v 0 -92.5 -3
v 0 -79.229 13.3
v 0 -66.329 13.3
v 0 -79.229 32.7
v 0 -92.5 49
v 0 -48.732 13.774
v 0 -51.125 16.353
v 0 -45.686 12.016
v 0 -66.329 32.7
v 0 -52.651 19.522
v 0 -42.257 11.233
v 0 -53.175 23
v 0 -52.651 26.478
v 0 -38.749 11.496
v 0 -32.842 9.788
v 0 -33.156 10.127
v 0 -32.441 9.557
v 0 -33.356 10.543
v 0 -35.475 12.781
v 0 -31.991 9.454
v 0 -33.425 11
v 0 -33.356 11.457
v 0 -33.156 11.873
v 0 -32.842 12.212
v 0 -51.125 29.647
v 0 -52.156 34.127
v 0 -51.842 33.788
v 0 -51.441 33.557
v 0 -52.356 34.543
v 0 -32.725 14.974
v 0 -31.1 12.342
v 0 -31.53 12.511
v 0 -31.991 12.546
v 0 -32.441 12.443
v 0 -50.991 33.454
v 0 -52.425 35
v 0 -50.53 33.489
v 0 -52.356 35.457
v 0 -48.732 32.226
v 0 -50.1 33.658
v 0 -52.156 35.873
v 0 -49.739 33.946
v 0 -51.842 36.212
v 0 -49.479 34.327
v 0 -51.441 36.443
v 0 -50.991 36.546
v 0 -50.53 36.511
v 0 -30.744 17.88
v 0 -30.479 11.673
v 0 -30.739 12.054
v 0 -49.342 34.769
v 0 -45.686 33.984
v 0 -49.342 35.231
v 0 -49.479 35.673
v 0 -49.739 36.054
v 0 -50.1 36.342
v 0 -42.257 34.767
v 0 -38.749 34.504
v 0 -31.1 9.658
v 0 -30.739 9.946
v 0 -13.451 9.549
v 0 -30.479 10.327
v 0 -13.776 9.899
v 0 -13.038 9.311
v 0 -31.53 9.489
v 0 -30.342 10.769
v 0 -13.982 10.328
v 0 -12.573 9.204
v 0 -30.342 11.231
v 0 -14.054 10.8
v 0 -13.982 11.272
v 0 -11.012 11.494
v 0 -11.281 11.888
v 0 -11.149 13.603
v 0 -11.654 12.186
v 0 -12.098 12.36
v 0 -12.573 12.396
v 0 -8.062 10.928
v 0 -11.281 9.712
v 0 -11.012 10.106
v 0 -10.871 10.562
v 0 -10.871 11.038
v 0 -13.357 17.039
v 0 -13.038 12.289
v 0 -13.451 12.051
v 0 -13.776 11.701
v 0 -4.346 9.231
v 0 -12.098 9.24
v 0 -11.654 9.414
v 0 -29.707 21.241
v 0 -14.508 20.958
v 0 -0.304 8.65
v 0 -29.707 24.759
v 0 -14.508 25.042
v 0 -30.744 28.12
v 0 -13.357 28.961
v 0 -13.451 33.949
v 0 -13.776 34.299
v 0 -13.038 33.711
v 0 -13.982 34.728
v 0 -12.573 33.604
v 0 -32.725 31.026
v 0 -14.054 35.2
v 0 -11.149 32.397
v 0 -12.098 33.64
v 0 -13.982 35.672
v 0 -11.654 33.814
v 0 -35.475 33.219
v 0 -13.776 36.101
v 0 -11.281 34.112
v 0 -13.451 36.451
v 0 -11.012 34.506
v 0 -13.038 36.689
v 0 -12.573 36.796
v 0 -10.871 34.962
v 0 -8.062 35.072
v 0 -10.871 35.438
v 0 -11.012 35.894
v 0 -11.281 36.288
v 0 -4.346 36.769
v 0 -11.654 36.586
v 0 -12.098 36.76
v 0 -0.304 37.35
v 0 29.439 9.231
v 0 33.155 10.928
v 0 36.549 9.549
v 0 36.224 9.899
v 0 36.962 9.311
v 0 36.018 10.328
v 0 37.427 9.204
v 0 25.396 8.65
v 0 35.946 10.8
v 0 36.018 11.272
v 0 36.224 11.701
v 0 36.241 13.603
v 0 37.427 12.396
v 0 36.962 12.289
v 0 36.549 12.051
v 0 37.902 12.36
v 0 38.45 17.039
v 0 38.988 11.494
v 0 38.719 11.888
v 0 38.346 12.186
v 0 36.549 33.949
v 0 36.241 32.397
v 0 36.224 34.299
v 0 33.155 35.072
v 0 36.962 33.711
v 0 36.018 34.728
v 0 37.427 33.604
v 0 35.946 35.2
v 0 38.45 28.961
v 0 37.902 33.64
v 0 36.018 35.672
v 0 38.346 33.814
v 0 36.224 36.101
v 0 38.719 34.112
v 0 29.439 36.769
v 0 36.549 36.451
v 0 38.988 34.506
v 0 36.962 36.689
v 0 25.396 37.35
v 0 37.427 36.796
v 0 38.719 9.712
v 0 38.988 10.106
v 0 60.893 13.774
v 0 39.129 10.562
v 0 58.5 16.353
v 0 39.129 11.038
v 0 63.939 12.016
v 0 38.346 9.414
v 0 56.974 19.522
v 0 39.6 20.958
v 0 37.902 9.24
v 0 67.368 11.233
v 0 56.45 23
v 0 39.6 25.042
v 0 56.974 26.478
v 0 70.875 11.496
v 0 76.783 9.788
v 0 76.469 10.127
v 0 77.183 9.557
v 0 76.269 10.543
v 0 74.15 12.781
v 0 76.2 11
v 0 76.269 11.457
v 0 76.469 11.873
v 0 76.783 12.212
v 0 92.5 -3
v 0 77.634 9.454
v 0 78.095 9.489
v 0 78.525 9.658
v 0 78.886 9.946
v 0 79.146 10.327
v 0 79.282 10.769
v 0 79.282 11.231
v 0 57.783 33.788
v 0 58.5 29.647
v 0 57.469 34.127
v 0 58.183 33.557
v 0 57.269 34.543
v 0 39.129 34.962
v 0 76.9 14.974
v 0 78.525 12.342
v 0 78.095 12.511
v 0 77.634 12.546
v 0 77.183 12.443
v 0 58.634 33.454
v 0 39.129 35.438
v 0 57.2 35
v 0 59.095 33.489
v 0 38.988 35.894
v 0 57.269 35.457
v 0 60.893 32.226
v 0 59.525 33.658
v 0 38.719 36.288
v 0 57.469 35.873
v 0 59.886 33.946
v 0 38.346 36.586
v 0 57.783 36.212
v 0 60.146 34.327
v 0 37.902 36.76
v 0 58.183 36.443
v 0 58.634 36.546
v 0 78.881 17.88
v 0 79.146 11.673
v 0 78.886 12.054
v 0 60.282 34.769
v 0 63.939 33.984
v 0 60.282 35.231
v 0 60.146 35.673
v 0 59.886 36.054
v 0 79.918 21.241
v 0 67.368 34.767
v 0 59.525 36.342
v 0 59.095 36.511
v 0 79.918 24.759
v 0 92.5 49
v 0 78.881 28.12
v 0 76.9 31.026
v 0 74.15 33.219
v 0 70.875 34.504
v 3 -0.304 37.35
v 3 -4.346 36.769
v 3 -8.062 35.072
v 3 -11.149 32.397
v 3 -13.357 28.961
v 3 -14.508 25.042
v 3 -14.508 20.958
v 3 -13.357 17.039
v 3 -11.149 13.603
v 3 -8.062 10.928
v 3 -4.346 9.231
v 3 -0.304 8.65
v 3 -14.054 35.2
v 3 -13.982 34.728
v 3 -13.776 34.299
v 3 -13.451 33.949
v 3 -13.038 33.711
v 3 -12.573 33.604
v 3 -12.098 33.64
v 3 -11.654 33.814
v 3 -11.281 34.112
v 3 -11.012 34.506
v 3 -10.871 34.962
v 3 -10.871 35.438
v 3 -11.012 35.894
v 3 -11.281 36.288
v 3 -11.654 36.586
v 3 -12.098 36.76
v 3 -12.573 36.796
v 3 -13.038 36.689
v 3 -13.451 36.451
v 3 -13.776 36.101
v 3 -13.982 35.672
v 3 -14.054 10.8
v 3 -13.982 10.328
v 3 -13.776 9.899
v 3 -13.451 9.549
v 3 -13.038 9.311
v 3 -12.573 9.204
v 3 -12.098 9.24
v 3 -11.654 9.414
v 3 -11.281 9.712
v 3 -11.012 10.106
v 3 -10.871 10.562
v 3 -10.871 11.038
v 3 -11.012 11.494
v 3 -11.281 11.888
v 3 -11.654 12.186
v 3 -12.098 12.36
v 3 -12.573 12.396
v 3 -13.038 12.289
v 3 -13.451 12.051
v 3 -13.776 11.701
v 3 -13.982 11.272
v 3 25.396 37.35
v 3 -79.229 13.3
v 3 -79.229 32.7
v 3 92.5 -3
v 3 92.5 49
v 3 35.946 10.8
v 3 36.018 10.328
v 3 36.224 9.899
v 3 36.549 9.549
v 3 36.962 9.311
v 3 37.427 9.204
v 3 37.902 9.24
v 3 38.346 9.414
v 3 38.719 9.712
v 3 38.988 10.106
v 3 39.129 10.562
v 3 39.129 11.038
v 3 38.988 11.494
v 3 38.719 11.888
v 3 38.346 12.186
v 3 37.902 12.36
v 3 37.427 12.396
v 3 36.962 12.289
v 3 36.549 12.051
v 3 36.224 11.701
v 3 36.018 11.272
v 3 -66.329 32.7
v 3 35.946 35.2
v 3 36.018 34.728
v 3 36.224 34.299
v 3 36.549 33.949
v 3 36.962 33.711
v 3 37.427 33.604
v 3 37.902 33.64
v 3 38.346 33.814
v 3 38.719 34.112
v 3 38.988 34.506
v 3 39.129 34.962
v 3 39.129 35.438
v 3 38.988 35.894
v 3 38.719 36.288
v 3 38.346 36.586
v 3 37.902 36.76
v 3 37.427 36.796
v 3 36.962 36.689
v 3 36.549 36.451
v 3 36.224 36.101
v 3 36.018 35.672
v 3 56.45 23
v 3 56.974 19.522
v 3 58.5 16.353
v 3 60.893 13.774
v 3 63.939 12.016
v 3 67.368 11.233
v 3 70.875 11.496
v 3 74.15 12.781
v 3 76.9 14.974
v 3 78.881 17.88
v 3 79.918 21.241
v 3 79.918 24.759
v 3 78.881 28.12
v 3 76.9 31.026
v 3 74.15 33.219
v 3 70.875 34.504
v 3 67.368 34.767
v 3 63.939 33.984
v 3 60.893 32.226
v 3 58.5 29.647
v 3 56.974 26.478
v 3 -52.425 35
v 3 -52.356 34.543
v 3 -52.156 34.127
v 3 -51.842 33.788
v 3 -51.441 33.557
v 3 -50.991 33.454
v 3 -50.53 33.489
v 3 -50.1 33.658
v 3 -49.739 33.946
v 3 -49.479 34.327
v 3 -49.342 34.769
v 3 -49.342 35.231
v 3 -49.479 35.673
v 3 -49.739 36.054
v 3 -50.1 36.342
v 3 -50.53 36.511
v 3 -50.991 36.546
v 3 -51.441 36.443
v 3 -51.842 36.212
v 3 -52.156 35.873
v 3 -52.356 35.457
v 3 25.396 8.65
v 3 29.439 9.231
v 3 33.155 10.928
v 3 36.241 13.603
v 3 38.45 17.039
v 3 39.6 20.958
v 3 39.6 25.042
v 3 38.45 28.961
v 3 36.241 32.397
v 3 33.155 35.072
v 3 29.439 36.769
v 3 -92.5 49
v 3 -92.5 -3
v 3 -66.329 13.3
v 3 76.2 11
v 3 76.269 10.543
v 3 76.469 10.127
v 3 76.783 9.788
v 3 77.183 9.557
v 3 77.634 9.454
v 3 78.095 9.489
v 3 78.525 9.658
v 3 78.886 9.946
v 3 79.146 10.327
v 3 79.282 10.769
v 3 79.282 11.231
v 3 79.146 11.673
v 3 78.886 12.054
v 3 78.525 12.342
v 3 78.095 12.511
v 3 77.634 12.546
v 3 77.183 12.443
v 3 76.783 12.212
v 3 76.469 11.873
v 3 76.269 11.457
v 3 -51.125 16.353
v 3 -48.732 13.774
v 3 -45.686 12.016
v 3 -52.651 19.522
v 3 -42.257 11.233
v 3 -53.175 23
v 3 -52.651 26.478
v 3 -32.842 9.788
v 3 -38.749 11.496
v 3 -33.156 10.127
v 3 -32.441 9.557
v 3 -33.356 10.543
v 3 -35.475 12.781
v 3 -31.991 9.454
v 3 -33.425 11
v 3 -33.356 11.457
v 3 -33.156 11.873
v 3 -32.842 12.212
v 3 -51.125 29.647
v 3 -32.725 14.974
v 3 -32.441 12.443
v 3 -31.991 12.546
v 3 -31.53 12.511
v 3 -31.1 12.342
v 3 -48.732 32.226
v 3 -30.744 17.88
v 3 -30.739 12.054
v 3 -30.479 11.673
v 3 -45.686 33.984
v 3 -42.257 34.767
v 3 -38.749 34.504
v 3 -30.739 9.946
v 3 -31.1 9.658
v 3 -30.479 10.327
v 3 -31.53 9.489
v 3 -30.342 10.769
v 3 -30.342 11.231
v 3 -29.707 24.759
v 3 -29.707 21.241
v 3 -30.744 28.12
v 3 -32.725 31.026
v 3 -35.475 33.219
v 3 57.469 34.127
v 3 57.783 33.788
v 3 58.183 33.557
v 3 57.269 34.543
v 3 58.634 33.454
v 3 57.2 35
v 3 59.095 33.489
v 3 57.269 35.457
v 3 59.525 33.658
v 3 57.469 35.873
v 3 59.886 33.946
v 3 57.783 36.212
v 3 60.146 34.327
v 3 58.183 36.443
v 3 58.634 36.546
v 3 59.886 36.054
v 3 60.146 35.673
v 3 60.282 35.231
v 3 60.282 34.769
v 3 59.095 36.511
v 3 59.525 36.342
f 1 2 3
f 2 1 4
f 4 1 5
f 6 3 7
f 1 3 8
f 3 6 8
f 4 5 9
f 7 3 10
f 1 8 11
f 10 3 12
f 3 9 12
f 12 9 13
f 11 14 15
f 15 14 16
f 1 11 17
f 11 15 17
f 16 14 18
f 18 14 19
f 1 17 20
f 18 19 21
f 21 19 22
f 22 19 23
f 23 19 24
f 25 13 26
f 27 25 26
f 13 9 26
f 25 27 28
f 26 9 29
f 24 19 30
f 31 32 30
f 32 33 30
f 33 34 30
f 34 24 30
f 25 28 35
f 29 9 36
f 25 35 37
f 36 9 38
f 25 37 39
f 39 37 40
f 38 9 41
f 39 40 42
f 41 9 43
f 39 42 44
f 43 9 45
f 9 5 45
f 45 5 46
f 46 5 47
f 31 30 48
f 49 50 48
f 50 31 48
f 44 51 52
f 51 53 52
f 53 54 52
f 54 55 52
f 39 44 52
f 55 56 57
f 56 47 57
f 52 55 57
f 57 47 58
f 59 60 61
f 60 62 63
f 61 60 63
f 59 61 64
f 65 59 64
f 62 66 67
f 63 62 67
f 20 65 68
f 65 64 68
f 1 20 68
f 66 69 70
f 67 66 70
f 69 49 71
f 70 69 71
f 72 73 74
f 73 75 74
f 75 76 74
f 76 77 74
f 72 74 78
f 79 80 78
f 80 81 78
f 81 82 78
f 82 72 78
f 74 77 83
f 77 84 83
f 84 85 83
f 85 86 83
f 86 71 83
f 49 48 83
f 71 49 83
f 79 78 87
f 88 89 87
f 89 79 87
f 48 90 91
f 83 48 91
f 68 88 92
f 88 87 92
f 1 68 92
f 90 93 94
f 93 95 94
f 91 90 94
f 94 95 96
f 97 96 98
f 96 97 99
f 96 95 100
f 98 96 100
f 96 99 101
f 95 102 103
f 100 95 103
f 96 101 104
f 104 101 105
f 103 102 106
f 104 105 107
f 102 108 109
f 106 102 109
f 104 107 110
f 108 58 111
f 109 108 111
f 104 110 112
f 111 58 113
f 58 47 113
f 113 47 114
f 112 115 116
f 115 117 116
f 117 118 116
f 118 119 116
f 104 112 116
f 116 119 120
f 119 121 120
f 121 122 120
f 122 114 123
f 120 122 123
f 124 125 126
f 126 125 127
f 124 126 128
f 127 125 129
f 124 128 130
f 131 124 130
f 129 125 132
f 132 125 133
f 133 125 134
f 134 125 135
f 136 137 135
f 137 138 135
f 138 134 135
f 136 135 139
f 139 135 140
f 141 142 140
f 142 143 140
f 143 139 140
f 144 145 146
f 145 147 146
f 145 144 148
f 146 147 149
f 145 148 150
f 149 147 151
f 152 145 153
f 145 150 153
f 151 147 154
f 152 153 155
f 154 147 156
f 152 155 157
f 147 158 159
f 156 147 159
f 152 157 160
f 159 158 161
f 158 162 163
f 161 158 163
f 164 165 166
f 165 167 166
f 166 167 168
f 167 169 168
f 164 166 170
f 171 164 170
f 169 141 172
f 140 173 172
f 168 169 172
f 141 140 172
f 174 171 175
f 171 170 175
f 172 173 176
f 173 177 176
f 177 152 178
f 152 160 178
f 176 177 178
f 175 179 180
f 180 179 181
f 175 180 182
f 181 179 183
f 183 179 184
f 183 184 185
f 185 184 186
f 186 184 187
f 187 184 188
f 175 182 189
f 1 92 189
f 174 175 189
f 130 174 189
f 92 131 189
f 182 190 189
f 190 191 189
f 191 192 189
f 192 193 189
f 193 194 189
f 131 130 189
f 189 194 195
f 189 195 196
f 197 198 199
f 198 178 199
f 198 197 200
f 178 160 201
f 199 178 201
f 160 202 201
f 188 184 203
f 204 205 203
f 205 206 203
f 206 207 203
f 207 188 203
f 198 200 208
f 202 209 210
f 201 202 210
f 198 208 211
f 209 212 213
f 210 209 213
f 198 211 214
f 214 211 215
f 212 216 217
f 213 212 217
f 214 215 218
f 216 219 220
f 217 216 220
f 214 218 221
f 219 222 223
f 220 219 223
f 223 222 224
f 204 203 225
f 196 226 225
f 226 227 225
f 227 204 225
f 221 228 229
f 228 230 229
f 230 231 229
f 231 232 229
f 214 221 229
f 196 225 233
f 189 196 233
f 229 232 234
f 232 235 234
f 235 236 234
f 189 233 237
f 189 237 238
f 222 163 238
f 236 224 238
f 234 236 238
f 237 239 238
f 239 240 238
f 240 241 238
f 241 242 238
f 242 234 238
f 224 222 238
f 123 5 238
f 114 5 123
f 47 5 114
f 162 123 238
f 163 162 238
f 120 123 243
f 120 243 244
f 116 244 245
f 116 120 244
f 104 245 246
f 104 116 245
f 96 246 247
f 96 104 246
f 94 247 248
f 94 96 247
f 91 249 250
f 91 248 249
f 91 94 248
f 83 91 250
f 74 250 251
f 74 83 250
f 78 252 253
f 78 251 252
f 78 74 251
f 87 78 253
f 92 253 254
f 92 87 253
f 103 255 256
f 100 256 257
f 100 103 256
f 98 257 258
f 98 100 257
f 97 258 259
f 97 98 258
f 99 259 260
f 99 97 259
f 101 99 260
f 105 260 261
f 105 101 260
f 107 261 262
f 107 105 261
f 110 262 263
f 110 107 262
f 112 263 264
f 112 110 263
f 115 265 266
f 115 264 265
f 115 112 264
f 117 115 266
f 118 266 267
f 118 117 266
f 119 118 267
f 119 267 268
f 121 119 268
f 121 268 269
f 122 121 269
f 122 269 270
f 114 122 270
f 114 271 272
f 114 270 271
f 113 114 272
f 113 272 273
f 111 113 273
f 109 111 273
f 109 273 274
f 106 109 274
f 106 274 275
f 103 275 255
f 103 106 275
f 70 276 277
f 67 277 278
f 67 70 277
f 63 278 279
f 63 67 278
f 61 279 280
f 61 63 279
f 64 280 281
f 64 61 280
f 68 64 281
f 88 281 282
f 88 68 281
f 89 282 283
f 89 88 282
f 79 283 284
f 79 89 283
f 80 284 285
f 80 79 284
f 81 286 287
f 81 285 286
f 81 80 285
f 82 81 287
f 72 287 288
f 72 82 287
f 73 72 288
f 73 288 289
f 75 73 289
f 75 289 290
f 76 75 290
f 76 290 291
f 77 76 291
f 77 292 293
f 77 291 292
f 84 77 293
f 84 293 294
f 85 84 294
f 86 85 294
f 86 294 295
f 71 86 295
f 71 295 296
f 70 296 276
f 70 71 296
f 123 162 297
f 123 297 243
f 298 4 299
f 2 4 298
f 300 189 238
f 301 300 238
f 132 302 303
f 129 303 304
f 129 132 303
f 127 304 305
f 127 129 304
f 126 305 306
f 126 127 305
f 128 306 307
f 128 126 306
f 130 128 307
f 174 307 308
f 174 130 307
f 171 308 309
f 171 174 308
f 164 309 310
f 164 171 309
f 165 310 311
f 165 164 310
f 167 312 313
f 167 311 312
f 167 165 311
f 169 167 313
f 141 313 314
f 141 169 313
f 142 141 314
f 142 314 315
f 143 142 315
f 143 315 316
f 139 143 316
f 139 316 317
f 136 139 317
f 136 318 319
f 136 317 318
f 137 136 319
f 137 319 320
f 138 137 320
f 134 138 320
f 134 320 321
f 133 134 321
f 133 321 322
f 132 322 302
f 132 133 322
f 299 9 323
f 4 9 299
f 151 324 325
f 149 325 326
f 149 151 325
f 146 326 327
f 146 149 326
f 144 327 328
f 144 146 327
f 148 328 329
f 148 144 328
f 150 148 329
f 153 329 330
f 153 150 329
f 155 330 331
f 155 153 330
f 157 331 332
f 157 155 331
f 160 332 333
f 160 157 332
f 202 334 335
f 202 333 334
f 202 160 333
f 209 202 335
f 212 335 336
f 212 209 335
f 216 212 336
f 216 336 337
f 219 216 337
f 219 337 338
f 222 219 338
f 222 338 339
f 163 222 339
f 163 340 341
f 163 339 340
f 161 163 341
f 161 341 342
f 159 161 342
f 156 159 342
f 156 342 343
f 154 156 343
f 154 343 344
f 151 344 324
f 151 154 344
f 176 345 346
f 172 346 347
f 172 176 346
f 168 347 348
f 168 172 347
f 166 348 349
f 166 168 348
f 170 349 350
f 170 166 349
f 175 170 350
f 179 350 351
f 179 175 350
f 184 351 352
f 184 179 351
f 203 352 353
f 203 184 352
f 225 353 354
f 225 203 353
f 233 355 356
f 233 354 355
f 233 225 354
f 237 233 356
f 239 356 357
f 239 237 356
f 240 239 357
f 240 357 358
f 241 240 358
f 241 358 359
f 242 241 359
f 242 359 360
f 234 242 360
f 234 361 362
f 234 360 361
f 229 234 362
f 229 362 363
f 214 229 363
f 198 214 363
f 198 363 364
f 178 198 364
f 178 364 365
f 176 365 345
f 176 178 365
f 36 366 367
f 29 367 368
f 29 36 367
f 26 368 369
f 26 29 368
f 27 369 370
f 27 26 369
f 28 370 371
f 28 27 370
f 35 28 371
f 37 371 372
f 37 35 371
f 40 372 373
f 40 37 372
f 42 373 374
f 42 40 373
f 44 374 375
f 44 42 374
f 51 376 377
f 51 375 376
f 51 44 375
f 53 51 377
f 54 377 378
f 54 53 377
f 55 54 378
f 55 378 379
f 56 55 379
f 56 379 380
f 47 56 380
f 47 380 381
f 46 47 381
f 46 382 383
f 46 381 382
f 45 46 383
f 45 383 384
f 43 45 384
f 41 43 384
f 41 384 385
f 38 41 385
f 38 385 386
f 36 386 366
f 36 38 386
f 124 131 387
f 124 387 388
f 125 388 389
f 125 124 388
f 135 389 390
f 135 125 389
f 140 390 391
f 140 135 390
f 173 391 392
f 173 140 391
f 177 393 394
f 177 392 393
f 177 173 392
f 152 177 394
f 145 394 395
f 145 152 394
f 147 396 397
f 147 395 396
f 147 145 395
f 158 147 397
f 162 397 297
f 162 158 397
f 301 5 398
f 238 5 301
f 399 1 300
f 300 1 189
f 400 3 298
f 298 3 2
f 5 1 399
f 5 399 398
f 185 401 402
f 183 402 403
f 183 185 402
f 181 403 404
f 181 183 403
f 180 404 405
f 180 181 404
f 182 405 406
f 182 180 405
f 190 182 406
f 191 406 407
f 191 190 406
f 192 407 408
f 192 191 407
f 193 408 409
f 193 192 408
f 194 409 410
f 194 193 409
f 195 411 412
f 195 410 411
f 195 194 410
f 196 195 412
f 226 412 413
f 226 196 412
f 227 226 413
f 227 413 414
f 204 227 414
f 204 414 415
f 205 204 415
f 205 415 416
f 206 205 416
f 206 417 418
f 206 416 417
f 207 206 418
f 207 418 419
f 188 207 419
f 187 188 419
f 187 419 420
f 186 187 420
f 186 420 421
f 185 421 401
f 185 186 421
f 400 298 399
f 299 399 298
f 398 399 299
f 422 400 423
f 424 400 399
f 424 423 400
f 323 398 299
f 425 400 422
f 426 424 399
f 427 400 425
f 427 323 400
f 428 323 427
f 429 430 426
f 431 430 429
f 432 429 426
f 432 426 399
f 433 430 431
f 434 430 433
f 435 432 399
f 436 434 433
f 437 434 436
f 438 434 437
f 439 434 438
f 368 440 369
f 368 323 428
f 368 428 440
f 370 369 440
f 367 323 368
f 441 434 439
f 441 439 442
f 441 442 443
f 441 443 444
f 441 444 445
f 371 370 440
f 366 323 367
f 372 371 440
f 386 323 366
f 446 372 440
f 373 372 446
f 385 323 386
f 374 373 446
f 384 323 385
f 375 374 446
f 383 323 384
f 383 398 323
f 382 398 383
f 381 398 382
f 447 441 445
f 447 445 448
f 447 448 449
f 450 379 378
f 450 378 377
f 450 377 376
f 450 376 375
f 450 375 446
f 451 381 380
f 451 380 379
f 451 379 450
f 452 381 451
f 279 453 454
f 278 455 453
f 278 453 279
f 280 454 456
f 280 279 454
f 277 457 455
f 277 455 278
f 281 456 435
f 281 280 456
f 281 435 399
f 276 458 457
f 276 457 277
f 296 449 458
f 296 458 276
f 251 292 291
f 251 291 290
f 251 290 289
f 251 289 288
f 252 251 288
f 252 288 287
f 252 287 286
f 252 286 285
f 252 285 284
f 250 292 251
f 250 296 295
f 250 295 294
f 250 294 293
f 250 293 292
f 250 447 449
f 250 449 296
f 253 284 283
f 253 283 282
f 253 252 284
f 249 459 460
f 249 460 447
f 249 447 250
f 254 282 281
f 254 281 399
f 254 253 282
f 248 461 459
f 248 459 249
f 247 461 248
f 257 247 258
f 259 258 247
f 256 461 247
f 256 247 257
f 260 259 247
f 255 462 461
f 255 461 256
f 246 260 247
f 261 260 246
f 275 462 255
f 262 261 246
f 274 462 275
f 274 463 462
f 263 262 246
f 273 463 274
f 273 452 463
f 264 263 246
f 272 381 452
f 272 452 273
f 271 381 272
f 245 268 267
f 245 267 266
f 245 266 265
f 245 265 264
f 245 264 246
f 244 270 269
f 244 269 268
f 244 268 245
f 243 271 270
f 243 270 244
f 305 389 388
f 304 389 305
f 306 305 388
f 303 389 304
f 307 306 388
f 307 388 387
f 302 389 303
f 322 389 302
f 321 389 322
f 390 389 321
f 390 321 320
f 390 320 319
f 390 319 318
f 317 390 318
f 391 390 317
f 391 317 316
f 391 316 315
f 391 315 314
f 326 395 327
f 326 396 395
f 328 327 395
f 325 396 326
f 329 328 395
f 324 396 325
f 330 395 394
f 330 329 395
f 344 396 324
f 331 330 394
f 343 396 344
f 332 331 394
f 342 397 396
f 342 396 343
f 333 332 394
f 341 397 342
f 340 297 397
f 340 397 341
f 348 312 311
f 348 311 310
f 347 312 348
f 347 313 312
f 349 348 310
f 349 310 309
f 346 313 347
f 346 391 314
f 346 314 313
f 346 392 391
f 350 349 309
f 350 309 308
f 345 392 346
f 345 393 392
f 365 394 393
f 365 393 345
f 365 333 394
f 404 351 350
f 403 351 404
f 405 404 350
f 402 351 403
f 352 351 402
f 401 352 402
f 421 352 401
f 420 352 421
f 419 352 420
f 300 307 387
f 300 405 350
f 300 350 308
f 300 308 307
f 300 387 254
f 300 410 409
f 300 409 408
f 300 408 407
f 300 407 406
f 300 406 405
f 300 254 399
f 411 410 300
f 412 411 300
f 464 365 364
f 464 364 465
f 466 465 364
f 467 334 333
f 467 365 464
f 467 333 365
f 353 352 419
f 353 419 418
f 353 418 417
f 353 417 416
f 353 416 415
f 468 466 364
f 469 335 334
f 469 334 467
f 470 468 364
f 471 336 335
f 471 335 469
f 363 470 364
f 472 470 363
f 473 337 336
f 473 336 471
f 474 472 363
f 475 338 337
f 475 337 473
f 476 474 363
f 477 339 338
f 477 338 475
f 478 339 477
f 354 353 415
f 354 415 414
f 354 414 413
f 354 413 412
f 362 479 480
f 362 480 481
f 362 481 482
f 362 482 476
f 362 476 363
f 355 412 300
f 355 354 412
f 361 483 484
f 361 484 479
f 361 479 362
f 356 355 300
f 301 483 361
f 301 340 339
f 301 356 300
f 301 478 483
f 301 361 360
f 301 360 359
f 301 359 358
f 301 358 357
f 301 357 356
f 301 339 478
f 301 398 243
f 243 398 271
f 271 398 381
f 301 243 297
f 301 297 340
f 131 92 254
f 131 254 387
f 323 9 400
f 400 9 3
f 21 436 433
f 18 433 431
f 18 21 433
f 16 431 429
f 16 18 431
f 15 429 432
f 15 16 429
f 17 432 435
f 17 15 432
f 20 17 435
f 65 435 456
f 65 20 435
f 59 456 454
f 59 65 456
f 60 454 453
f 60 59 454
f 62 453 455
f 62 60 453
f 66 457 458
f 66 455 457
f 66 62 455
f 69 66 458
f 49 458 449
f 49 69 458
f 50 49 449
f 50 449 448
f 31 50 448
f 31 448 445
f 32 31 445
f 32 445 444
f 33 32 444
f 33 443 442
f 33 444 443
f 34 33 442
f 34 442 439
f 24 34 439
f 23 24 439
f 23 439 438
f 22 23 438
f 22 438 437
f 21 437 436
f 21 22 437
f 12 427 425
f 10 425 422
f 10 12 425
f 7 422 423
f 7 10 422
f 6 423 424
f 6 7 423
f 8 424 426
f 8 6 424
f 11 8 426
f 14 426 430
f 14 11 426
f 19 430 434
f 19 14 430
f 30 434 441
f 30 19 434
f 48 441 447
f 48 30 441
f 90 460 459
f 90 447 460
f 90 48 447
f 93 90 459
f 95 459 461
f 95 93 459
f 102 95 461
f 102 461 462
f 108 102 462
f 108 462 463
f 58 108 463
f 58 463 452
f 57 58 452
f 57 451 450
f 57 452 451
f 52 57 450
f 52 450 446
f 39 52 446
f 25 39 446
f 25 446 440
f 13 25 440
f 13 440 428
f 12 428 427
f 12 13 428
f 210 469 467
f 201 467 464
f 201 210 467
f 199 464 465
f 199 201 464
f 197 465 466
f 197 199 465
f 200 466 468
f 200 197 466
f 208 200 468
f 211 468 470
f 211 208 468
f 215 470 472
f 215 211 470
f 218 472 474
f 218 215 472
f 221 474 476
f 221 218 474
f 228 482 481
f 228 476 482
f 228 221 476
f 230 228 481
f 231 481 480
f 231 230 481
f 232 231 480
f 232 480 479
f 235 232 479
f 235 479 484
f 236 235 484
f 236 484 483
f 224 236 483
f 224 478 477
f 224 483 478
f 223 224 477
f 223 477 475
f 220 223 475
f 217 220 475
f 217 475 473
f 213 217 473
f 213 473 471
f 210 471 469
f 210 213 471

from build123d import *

# Parameters (mm, degrees)
SKETCH_W        = 185
SKETCH_H        = 52
PAD_DEPTH       = 3
SHAPEBINDER_R   = 11.8
SHAPEBINDER_R_2 = 1.55
SHAPEBINDER_W   = 12.9
SHAPEBINDER_H   = 19.4
SHAPEBINDER_R_3 = 1.6
POCKET_DEPTH    = 5


with BuildPart() as part:
    # Sketch → Pad (new body)
    with BuildSketch(Plane.YZ):
        with Locations((0, 23)):
            Rectangle(SKETCH_W, SKETCH_H)
    extrude(amount=PAD_DEPTH)

    # ShapeBinder → Pocket (cut)
    with BuildSketch(Plane(origin=(0, 0.410224, 23), x_dir=(0, -1, 0), z_dir=(1, 0, 0))):
        with Locations((-67.839494, 0)):
            Circle(SHAPEBINDER_R)
        with Locations((-58.339494, -12)):
            Circle(SHAPEBINDER_R_2)
        with Locations((-77.339494, 12)):
            Circle(SHAPEBINDER_R_2)
        with BuildLine():
            ThreePointArc((-24.986195, 14.35), (-39.336195, 0), (-24.986195, -14.35))
            Line((-24.986195, -14.35), (0.713805, -14.35))
            ThreePointArc((0.713805, -14.35), (15.063805, 0), (0.713805, 14.35))
            Line((0.713805, 14.35), (-24.986195, 14.35))
        make_face()
        with Locations((41.785392, 0)):
            Circle(SHAPEBINDER_R)
        with Locations((32.285392, 12)):
            Circle(SHAPEBINDER_R_2)
        with Locations((51.285392, -12)):
            Circle(SHAPEBINDER_R_2)
        with Locations((73.189494, 0)):
            Rectangle(SHAPEBINDER_W, SHAPEBINDER_H)
        with Locations((12.863805, -12.2)):
            Circle(SHAPEBINDER_R_3)
        with Locations((12.863805, 12.2)):
            Circle(SHAPEBINDER_R_3)
        with Locations((-37.136195, 12.2)):
            Circle(SHAPEBINDER_R_3)
        with Locations((-37.136195, -12.2)):
            Circle(SHAPEBINDER_R_3)
    extrude(amount=POCKET_DEPTH, mode=Mode.SUBTRACT)


solid = part.part
